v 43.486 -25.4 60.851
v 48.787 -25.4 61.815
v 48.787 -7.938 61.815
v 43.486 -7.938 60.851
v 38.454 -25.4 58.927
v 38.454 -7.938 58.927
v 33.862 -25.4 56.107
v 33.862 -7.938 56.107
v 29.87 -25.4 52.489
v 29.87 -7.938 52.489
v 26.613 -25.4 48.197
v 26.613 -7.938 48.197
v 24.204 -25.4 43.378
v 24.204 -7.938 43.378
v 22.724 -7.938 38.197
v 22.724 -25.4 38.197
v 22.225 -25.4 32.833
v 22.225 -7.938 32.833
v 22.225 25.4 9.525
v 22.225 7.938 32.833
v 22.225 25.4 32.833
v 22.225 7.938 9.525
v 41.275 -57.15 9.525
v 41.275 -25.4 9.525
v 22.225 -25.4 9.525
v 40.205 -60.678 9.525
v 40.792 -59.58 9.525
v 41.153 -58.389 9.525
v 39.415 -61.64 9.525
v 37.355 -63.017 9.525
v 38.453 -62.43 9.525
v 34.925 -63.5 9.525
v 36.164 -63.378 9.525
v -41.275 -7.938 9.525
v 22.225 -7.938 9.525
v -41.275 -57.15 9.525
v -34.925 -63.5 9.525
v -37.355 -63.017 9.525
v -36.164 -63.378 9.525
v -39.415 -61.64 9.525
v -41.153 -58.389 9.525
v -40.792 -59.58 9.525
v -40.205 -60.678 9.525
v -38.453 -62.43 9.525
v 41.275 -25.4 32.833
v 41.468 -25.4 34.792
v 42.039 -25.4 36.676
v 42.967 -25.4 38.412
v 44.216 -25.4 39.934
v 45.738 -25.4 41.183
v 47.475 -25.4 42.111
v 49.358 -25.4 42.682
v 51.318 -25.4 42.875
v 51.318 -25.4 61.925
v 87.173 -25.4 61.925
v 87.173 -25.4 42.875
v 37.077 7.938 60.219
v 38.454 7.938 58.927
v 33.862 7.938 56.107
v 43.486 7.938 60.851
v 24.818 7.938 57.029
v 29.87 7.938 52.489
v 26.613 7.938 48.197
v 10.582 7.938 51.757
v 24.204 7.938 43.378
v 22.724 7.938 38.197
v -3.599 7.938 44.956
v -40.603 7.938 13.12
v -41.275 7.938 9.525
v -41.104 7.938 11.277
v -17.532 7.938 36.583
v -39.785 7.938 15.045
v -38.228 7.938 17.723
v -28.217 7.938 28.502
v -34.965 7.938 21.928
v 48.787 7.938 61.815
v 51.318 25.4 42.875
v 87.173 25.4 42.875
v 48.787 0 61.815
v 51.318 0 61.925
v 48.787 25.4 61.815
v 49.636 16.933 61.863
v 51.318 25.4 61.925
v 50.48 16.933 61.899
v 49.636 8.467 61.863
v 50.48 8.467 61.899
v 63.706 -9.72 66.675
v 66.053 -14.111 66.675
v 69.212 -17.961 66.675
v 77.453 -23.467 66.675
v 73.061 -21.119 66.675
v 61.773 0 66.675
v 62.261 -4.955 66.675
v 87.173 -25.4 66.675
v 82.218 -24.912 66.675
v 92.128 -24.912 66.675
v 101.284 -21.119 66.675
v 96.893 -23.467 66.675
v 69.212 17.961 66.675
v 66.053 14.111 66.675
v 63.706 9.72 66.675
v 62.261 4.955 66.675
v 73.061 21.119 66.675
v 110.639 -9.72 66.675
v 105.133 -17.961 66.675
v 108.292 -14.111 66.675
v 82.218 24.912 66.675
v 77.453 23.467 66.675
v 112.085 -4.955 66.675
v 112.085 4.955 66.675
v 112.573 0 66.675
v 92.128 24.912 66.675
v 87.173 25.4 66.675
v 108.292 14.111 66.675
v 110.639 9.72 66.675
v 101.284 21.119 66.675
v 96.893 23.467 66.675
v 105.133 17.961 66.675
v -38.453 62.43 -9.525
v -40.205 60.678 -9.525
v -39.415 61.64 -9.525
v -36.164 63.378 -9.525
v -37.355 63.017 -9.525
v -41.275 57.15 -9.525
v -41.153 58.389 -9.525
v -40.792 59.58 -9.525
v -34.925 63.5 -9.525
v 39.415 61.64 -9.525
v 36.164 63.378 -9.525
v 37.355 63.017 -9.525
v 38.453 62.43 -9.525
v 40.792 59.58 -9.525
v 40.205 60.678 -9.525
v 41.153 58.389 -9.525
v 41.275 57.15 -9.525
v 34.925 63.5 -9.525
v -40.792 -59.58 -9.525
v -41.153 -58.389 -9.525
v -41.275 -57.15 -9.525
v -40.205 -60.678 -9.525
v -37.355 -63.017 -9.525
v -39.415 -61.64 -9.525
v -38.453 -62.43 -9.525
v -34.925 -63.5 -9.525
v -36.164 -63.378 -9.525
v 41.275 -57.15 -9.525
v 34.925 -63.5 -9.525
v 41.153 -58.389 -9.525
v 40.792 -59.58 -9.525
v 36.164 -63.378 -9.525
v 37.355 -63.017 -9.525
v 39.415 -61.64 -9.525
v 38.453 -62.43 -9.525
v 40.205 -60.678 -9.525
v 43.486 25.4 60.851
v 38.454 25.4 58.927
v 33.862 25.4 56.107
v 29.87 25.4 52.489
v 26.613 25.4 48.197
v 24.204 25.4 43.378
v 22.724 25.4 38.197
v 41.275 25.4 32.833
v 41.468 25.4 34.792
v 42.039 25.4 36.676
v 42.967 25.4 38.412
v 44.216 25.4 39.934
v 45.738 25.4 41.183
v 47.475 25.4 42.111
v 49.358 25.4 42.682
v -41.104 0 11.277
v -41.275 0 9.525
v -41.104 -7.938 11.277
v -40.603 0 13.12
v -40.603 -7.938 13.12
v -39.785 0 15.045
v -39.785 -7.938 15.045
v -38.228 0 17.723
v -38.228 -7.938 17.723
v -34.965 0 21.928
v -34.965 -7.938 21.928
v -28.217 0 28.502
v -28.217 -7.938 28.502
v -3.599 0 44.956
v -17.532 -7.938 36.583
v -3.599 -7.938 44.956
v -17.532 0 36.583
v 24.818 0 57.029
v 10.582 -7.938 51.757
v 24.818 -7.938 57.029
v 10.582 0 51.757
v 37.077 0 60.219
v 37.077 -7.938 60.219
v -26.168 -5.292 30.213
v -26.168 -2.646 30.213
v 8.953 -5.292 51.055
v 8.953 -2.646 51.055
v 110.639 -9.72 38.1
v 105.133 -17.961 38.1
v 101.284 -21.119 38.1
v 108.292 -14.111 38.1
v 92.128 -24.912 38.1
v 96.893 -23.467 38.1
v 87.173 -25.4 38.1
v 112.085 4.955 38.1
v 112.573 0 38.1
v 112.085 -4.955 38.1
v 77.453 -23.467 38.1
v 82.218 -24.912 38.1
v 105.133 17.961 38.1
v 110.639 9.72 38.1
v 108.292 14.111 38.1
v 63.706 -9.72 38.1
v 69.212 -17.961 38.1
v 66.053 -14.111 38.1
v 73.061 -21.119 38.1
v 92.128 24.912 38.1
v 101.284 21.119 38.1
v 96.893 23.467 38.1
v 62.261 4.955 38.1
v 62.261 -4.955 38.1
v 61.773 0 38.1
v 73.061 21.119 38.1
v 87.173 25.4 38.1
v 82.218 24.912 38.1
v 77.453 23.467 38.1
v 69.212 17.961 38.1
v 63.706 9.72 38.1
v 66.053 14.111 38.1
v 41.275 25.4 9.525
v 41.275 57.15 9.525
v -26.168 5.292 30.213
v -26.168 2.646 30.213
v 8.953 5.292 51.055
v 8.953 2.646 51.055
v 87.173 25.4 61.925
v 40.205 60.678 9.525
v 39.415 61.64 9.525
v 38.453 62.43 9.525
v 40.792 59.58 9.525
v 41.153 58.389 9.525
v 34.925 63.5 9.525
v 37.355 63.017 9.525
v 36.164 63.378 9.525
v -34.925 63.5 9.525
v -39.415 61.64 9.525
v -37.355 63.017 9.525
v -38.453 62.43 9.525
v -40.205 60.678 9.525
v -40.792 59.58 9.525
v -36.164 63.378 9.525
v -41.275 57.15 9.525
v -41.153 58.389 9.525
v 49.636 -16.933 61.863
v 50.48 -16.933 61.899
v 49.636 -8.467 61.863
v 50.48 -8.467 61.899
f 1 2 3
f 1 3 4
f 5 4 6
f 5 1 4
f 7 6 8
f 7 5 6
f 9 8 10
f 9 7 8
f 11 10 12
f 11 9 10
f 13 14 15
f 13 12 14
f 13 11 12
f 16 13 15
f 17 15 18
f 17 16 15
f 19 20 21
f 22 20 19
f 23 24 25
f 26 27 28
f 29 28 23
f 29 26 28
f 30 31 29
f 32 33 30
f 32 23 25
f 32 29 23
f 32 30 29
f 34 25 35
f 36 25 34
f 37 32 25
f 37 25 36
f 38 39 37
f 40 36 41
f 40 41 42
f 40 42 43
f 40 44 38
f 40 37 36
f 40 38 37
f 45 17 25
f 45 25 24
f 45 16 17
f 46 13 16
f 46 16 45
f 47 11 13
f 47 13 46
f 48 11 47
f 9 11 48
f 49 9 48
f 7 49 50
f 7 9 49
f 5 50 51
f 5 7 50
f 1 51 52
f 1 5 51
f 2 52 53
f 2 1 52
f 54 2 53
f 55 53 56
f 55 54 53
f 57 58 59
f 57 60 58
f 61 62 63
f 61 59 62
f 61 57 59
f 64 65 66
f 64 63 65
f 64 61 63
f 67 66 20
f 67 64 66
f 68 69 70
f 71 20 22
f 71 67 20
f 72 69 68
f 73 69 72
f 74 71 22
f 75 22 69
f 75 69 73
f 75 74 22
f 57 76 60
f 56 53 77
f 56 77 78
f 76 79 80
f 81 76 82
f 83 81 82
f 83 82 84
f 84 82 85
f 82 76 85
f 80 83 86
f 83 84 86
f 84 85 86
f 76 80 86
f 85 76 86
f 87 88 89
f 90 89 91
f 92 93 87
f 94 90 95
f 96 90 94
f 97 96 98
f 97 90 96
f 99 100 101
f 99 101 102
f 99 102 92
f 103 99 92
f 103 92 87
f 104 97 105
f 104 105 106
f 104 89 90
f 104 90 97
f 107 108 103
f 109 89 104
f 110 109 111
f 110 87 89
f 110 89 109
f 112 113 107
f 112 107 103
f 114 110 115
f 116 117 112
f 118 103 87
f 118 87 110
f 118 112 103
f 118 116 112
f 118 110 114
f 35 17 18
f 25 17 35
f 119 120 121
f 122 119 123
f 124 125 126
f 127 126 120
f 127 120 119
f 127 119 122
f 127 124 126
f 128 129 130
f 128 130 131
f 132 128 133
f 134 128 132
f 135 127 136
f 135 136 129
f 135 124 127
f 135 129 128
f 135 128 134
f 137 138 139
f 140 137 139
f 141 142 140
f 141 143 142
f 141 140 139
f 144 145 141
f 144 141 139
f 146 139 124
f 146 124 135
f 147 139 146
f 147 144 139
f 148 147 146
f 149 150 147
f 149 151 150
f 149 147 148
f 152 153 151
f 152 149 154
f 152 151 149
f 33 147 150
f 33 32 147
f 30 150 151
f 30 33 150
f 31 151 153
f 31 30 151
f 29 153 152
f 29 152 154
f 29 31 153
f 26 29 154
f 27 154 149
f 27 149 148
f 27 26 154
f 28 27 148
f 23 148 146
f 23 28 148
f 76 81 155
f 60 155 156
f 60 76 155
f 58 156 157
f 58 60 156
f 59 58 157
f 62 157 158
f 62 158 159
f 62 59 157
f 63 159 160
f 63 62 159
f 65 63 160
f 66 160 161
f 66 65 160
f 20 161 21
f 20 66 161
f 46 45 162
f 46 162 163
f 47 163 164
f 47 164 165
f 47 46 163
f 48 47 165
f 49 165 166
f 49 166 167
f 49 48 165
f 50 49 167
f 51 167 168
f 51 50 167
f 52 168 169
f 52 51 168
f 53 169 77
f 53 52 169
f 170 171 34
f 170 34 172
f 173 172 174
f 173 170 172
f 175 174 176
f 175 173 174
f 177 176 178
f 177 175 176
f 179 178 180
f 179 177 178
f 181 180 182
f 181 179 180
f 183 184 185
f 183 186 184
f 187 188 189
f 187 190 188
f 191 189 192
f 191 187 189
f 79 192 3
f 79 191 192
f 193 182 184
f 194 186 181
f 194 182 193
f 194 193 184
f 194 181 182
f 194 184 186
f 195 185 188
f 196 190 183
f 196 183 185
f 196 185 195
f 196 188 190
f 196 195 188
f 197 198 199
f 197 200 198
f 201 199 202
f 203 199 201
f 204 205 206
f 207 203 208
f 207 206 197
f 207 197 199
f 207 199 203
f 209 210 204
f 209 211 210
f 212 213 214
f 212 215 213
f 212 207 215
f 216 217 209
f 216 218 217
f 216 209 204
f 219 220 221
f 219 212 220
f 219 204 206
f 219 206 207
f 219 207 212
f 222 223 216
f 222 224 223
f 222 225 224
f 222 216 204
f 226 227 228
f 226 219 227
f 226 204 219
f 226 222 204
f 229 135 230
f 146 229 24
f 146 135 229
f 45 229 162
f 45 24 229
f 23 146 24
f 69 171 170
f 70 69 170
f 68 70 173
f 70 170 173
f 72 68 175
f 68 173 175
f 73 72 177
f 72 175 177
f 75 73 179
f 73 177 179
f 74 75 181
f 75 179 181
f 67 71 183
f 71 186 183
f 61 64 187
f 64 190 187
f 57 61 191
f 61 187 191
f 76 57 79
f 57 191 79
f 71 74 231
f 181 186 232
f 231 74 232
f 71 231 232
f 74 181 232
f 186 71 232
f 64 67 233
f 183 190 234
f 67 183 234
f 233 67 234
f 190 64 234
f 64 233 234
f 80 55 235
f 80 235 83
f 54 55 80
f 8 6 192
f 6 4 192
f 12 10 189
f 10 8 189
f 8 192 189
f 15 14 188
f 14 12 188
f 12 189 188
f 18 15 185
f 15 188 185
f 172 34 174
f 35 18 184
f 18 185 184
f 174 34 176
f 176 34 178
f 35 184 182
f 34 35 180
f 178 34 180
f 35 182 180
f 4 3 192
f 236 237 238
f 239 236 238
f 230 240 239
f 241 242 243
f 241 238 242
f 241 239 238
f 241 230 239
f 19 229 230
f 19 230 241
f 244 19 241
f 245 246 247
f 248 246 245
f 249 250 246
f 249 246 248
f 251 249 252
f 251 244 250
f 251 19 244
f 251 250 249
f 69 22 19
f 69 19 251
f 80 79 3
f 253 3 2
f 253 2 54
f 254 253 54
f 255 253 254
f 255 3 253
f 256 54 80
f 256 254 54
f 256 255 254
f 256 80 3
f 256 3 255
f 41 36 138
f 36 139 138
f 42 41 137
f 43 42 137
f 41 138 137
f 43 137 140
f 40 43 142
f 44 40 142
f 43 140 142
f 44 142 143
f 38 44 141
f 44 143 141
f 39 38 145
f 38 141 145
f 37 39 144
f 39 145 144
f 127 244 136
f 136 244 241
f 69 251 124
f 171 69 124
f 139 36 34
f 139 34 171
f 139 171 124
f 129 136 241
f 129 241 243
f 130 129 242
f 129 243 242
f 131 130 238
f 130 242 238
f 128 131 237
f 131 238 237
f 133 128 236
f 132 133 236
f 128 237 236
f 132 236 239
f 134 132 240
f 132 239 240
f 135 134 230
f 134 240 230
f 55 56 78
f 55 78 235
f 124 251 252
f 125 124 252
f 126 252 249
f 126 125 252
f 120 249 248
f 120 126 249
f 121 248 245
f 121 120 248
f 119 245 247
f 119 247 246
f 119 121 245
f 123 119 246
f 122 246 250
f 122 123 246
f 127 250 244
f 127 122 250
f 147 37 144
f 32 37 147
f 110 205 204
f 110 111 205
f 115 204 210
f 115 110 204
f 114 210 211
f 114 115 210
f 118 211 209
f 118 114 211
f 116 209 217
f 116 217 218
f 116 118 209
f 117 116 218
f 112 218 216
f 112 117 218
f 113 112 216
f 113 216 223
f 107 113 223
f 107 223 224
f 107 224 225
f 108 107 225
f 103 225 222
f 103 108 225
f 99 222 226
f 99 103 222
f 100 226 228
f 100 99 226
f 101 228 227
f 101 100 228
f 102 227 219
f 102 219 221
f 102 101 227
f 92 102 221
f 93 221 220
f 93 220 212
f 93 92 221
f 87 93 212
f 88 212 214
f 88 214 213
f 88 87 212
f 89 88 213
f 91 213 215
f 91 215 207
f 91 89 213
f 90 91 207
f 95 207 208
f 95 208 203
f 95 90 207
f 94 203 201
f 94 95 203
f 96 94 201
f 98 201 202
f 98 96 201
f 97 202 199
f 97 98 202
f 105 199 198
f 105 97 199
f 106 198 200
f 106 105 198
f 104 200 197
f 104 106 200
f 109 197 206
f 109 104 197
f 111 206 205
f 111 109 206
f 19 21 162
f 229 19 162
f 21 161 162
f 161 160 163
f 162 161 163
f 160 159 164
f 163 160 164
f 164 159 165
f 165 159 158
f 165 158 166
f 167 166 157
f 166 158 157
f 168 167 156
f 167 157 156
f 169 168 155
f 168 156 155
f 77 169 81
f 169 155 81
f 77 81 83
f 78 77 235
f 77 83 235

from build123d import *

# Parameters (mm, degrees)
F1_DEPTH = 63.5
F0_W     = 25.4
F0_H     = 19.05
F2_DEPTH = 25.4
F3_DEPTH = 7.9375
F5_R     = 6.35


with BuildPart() as f1:
    # F0 (on Front) → F1 (new body, symmetric)
    with BuildSketch(Plane.XZ):
        Polygon((22.225, 9.525), (-41.275, 9.525), (-41.275, -9.525), (41.275, -9.525), (41.275, 9.525), align=None)
    extrude(amount=F1_DEPTH, both=True)

    # F0 (on Front) → F2 (join, symmetric)
    with BuildSketch(Plane.XZ):
        with BuildLine():
            Line((22.225, 32.832524617), (22.225, 9.525))
            Line((22.225, 9.525), (41.275, 9.525))
            Line((41.275, 9.525), (41.275, 32.832524617))
            ThreePointArc((41.275, 32.832524617), (44.2164315184, 39.9337684816), (51.317675383, 42.8752))
            Line((51.317675383, 42.8752), (61.7728, 42.8752))
            Line((61.7728, 42.8752), (61.7728, 61.9252))
            Line((61.7728, 61.9252), (51.317675383, 61.9252))
            add(Edge.make_bspline(
                [(48.7869792992, 61.8149216585), (49.6392067374, 61.8679555111), (50.483050491, 61.9049011825), (51.317675383, 61.9252)],
                knots=[104.0020273905, 104.0020273905, 104.0020273905, 104.0020273905, 106.3916561325, 106.3916561325, 106.3916561325, 106.3916561325], degree=3))
            ThreePointArc((48.7869792992, 61.8149216585), (29.8699659412, 52.4890634945), (22.225, 32.832524617))
        make_face()
        with Locations((74.4728, 52.4002)):
            Rectangle(F0_W, F0_H)
    extrude(amount=F2_DEPTH, both=True)

    # F0 (on Front) → F3 (join, symmetric)
    with BuildSketch(Plane.XZ):
        with BuildLine():
            add(Edge.make_bspline(
                [(-41.275, 9.525), (-41.275, 26.7246001951), (11.6961208685, 59.5067688946), (48.7869792992, 61.8149216585)],
                knots=[0, 0, 0, 0, 104.0020273905, 104.0020273905, 104.0020273905, 104.0020273905], degree=3))
            Line((-41.275, 9.525), (22.225, 9.525))
            Line((22.225, 9.525), (22.225, 32.832524617))
            ThreePointArc((22.225, 32.832524617), (29.8699659412, 52.4890634945), (48.7869792992, 61.8149216585))
        make_face()
    extrude(amount=F3_DEPTH, both=True)

    # F5
    f5_edges = [f1.edges().sort_by_distance(p)[0] for p in [
        (41.275, 63.5, 0),
        (-41.275, 63.5, 0),
        (-41.275, -63.5, 0),
        (41.275, -63.5, 0),
    ]]
    fillet(f5_edges, radius=F5_R)


with BuildPart() as f4:
    # F0 (on Front) → F4 (revolve)
    with BuildSketch(Plane.XZ):
        Polygon((87.1728, 66.675), (87.1728, 61.9252), (87.1728, 42.8752), (87.1728, 38.1), (112.5728, 38.1), (112.5728, 66.675), align=None)
    revolve(axis=Axis((87.1728, 0, 52.3875), (0, 0, 1)))


solid = Compound([f1.part, f4.part])
